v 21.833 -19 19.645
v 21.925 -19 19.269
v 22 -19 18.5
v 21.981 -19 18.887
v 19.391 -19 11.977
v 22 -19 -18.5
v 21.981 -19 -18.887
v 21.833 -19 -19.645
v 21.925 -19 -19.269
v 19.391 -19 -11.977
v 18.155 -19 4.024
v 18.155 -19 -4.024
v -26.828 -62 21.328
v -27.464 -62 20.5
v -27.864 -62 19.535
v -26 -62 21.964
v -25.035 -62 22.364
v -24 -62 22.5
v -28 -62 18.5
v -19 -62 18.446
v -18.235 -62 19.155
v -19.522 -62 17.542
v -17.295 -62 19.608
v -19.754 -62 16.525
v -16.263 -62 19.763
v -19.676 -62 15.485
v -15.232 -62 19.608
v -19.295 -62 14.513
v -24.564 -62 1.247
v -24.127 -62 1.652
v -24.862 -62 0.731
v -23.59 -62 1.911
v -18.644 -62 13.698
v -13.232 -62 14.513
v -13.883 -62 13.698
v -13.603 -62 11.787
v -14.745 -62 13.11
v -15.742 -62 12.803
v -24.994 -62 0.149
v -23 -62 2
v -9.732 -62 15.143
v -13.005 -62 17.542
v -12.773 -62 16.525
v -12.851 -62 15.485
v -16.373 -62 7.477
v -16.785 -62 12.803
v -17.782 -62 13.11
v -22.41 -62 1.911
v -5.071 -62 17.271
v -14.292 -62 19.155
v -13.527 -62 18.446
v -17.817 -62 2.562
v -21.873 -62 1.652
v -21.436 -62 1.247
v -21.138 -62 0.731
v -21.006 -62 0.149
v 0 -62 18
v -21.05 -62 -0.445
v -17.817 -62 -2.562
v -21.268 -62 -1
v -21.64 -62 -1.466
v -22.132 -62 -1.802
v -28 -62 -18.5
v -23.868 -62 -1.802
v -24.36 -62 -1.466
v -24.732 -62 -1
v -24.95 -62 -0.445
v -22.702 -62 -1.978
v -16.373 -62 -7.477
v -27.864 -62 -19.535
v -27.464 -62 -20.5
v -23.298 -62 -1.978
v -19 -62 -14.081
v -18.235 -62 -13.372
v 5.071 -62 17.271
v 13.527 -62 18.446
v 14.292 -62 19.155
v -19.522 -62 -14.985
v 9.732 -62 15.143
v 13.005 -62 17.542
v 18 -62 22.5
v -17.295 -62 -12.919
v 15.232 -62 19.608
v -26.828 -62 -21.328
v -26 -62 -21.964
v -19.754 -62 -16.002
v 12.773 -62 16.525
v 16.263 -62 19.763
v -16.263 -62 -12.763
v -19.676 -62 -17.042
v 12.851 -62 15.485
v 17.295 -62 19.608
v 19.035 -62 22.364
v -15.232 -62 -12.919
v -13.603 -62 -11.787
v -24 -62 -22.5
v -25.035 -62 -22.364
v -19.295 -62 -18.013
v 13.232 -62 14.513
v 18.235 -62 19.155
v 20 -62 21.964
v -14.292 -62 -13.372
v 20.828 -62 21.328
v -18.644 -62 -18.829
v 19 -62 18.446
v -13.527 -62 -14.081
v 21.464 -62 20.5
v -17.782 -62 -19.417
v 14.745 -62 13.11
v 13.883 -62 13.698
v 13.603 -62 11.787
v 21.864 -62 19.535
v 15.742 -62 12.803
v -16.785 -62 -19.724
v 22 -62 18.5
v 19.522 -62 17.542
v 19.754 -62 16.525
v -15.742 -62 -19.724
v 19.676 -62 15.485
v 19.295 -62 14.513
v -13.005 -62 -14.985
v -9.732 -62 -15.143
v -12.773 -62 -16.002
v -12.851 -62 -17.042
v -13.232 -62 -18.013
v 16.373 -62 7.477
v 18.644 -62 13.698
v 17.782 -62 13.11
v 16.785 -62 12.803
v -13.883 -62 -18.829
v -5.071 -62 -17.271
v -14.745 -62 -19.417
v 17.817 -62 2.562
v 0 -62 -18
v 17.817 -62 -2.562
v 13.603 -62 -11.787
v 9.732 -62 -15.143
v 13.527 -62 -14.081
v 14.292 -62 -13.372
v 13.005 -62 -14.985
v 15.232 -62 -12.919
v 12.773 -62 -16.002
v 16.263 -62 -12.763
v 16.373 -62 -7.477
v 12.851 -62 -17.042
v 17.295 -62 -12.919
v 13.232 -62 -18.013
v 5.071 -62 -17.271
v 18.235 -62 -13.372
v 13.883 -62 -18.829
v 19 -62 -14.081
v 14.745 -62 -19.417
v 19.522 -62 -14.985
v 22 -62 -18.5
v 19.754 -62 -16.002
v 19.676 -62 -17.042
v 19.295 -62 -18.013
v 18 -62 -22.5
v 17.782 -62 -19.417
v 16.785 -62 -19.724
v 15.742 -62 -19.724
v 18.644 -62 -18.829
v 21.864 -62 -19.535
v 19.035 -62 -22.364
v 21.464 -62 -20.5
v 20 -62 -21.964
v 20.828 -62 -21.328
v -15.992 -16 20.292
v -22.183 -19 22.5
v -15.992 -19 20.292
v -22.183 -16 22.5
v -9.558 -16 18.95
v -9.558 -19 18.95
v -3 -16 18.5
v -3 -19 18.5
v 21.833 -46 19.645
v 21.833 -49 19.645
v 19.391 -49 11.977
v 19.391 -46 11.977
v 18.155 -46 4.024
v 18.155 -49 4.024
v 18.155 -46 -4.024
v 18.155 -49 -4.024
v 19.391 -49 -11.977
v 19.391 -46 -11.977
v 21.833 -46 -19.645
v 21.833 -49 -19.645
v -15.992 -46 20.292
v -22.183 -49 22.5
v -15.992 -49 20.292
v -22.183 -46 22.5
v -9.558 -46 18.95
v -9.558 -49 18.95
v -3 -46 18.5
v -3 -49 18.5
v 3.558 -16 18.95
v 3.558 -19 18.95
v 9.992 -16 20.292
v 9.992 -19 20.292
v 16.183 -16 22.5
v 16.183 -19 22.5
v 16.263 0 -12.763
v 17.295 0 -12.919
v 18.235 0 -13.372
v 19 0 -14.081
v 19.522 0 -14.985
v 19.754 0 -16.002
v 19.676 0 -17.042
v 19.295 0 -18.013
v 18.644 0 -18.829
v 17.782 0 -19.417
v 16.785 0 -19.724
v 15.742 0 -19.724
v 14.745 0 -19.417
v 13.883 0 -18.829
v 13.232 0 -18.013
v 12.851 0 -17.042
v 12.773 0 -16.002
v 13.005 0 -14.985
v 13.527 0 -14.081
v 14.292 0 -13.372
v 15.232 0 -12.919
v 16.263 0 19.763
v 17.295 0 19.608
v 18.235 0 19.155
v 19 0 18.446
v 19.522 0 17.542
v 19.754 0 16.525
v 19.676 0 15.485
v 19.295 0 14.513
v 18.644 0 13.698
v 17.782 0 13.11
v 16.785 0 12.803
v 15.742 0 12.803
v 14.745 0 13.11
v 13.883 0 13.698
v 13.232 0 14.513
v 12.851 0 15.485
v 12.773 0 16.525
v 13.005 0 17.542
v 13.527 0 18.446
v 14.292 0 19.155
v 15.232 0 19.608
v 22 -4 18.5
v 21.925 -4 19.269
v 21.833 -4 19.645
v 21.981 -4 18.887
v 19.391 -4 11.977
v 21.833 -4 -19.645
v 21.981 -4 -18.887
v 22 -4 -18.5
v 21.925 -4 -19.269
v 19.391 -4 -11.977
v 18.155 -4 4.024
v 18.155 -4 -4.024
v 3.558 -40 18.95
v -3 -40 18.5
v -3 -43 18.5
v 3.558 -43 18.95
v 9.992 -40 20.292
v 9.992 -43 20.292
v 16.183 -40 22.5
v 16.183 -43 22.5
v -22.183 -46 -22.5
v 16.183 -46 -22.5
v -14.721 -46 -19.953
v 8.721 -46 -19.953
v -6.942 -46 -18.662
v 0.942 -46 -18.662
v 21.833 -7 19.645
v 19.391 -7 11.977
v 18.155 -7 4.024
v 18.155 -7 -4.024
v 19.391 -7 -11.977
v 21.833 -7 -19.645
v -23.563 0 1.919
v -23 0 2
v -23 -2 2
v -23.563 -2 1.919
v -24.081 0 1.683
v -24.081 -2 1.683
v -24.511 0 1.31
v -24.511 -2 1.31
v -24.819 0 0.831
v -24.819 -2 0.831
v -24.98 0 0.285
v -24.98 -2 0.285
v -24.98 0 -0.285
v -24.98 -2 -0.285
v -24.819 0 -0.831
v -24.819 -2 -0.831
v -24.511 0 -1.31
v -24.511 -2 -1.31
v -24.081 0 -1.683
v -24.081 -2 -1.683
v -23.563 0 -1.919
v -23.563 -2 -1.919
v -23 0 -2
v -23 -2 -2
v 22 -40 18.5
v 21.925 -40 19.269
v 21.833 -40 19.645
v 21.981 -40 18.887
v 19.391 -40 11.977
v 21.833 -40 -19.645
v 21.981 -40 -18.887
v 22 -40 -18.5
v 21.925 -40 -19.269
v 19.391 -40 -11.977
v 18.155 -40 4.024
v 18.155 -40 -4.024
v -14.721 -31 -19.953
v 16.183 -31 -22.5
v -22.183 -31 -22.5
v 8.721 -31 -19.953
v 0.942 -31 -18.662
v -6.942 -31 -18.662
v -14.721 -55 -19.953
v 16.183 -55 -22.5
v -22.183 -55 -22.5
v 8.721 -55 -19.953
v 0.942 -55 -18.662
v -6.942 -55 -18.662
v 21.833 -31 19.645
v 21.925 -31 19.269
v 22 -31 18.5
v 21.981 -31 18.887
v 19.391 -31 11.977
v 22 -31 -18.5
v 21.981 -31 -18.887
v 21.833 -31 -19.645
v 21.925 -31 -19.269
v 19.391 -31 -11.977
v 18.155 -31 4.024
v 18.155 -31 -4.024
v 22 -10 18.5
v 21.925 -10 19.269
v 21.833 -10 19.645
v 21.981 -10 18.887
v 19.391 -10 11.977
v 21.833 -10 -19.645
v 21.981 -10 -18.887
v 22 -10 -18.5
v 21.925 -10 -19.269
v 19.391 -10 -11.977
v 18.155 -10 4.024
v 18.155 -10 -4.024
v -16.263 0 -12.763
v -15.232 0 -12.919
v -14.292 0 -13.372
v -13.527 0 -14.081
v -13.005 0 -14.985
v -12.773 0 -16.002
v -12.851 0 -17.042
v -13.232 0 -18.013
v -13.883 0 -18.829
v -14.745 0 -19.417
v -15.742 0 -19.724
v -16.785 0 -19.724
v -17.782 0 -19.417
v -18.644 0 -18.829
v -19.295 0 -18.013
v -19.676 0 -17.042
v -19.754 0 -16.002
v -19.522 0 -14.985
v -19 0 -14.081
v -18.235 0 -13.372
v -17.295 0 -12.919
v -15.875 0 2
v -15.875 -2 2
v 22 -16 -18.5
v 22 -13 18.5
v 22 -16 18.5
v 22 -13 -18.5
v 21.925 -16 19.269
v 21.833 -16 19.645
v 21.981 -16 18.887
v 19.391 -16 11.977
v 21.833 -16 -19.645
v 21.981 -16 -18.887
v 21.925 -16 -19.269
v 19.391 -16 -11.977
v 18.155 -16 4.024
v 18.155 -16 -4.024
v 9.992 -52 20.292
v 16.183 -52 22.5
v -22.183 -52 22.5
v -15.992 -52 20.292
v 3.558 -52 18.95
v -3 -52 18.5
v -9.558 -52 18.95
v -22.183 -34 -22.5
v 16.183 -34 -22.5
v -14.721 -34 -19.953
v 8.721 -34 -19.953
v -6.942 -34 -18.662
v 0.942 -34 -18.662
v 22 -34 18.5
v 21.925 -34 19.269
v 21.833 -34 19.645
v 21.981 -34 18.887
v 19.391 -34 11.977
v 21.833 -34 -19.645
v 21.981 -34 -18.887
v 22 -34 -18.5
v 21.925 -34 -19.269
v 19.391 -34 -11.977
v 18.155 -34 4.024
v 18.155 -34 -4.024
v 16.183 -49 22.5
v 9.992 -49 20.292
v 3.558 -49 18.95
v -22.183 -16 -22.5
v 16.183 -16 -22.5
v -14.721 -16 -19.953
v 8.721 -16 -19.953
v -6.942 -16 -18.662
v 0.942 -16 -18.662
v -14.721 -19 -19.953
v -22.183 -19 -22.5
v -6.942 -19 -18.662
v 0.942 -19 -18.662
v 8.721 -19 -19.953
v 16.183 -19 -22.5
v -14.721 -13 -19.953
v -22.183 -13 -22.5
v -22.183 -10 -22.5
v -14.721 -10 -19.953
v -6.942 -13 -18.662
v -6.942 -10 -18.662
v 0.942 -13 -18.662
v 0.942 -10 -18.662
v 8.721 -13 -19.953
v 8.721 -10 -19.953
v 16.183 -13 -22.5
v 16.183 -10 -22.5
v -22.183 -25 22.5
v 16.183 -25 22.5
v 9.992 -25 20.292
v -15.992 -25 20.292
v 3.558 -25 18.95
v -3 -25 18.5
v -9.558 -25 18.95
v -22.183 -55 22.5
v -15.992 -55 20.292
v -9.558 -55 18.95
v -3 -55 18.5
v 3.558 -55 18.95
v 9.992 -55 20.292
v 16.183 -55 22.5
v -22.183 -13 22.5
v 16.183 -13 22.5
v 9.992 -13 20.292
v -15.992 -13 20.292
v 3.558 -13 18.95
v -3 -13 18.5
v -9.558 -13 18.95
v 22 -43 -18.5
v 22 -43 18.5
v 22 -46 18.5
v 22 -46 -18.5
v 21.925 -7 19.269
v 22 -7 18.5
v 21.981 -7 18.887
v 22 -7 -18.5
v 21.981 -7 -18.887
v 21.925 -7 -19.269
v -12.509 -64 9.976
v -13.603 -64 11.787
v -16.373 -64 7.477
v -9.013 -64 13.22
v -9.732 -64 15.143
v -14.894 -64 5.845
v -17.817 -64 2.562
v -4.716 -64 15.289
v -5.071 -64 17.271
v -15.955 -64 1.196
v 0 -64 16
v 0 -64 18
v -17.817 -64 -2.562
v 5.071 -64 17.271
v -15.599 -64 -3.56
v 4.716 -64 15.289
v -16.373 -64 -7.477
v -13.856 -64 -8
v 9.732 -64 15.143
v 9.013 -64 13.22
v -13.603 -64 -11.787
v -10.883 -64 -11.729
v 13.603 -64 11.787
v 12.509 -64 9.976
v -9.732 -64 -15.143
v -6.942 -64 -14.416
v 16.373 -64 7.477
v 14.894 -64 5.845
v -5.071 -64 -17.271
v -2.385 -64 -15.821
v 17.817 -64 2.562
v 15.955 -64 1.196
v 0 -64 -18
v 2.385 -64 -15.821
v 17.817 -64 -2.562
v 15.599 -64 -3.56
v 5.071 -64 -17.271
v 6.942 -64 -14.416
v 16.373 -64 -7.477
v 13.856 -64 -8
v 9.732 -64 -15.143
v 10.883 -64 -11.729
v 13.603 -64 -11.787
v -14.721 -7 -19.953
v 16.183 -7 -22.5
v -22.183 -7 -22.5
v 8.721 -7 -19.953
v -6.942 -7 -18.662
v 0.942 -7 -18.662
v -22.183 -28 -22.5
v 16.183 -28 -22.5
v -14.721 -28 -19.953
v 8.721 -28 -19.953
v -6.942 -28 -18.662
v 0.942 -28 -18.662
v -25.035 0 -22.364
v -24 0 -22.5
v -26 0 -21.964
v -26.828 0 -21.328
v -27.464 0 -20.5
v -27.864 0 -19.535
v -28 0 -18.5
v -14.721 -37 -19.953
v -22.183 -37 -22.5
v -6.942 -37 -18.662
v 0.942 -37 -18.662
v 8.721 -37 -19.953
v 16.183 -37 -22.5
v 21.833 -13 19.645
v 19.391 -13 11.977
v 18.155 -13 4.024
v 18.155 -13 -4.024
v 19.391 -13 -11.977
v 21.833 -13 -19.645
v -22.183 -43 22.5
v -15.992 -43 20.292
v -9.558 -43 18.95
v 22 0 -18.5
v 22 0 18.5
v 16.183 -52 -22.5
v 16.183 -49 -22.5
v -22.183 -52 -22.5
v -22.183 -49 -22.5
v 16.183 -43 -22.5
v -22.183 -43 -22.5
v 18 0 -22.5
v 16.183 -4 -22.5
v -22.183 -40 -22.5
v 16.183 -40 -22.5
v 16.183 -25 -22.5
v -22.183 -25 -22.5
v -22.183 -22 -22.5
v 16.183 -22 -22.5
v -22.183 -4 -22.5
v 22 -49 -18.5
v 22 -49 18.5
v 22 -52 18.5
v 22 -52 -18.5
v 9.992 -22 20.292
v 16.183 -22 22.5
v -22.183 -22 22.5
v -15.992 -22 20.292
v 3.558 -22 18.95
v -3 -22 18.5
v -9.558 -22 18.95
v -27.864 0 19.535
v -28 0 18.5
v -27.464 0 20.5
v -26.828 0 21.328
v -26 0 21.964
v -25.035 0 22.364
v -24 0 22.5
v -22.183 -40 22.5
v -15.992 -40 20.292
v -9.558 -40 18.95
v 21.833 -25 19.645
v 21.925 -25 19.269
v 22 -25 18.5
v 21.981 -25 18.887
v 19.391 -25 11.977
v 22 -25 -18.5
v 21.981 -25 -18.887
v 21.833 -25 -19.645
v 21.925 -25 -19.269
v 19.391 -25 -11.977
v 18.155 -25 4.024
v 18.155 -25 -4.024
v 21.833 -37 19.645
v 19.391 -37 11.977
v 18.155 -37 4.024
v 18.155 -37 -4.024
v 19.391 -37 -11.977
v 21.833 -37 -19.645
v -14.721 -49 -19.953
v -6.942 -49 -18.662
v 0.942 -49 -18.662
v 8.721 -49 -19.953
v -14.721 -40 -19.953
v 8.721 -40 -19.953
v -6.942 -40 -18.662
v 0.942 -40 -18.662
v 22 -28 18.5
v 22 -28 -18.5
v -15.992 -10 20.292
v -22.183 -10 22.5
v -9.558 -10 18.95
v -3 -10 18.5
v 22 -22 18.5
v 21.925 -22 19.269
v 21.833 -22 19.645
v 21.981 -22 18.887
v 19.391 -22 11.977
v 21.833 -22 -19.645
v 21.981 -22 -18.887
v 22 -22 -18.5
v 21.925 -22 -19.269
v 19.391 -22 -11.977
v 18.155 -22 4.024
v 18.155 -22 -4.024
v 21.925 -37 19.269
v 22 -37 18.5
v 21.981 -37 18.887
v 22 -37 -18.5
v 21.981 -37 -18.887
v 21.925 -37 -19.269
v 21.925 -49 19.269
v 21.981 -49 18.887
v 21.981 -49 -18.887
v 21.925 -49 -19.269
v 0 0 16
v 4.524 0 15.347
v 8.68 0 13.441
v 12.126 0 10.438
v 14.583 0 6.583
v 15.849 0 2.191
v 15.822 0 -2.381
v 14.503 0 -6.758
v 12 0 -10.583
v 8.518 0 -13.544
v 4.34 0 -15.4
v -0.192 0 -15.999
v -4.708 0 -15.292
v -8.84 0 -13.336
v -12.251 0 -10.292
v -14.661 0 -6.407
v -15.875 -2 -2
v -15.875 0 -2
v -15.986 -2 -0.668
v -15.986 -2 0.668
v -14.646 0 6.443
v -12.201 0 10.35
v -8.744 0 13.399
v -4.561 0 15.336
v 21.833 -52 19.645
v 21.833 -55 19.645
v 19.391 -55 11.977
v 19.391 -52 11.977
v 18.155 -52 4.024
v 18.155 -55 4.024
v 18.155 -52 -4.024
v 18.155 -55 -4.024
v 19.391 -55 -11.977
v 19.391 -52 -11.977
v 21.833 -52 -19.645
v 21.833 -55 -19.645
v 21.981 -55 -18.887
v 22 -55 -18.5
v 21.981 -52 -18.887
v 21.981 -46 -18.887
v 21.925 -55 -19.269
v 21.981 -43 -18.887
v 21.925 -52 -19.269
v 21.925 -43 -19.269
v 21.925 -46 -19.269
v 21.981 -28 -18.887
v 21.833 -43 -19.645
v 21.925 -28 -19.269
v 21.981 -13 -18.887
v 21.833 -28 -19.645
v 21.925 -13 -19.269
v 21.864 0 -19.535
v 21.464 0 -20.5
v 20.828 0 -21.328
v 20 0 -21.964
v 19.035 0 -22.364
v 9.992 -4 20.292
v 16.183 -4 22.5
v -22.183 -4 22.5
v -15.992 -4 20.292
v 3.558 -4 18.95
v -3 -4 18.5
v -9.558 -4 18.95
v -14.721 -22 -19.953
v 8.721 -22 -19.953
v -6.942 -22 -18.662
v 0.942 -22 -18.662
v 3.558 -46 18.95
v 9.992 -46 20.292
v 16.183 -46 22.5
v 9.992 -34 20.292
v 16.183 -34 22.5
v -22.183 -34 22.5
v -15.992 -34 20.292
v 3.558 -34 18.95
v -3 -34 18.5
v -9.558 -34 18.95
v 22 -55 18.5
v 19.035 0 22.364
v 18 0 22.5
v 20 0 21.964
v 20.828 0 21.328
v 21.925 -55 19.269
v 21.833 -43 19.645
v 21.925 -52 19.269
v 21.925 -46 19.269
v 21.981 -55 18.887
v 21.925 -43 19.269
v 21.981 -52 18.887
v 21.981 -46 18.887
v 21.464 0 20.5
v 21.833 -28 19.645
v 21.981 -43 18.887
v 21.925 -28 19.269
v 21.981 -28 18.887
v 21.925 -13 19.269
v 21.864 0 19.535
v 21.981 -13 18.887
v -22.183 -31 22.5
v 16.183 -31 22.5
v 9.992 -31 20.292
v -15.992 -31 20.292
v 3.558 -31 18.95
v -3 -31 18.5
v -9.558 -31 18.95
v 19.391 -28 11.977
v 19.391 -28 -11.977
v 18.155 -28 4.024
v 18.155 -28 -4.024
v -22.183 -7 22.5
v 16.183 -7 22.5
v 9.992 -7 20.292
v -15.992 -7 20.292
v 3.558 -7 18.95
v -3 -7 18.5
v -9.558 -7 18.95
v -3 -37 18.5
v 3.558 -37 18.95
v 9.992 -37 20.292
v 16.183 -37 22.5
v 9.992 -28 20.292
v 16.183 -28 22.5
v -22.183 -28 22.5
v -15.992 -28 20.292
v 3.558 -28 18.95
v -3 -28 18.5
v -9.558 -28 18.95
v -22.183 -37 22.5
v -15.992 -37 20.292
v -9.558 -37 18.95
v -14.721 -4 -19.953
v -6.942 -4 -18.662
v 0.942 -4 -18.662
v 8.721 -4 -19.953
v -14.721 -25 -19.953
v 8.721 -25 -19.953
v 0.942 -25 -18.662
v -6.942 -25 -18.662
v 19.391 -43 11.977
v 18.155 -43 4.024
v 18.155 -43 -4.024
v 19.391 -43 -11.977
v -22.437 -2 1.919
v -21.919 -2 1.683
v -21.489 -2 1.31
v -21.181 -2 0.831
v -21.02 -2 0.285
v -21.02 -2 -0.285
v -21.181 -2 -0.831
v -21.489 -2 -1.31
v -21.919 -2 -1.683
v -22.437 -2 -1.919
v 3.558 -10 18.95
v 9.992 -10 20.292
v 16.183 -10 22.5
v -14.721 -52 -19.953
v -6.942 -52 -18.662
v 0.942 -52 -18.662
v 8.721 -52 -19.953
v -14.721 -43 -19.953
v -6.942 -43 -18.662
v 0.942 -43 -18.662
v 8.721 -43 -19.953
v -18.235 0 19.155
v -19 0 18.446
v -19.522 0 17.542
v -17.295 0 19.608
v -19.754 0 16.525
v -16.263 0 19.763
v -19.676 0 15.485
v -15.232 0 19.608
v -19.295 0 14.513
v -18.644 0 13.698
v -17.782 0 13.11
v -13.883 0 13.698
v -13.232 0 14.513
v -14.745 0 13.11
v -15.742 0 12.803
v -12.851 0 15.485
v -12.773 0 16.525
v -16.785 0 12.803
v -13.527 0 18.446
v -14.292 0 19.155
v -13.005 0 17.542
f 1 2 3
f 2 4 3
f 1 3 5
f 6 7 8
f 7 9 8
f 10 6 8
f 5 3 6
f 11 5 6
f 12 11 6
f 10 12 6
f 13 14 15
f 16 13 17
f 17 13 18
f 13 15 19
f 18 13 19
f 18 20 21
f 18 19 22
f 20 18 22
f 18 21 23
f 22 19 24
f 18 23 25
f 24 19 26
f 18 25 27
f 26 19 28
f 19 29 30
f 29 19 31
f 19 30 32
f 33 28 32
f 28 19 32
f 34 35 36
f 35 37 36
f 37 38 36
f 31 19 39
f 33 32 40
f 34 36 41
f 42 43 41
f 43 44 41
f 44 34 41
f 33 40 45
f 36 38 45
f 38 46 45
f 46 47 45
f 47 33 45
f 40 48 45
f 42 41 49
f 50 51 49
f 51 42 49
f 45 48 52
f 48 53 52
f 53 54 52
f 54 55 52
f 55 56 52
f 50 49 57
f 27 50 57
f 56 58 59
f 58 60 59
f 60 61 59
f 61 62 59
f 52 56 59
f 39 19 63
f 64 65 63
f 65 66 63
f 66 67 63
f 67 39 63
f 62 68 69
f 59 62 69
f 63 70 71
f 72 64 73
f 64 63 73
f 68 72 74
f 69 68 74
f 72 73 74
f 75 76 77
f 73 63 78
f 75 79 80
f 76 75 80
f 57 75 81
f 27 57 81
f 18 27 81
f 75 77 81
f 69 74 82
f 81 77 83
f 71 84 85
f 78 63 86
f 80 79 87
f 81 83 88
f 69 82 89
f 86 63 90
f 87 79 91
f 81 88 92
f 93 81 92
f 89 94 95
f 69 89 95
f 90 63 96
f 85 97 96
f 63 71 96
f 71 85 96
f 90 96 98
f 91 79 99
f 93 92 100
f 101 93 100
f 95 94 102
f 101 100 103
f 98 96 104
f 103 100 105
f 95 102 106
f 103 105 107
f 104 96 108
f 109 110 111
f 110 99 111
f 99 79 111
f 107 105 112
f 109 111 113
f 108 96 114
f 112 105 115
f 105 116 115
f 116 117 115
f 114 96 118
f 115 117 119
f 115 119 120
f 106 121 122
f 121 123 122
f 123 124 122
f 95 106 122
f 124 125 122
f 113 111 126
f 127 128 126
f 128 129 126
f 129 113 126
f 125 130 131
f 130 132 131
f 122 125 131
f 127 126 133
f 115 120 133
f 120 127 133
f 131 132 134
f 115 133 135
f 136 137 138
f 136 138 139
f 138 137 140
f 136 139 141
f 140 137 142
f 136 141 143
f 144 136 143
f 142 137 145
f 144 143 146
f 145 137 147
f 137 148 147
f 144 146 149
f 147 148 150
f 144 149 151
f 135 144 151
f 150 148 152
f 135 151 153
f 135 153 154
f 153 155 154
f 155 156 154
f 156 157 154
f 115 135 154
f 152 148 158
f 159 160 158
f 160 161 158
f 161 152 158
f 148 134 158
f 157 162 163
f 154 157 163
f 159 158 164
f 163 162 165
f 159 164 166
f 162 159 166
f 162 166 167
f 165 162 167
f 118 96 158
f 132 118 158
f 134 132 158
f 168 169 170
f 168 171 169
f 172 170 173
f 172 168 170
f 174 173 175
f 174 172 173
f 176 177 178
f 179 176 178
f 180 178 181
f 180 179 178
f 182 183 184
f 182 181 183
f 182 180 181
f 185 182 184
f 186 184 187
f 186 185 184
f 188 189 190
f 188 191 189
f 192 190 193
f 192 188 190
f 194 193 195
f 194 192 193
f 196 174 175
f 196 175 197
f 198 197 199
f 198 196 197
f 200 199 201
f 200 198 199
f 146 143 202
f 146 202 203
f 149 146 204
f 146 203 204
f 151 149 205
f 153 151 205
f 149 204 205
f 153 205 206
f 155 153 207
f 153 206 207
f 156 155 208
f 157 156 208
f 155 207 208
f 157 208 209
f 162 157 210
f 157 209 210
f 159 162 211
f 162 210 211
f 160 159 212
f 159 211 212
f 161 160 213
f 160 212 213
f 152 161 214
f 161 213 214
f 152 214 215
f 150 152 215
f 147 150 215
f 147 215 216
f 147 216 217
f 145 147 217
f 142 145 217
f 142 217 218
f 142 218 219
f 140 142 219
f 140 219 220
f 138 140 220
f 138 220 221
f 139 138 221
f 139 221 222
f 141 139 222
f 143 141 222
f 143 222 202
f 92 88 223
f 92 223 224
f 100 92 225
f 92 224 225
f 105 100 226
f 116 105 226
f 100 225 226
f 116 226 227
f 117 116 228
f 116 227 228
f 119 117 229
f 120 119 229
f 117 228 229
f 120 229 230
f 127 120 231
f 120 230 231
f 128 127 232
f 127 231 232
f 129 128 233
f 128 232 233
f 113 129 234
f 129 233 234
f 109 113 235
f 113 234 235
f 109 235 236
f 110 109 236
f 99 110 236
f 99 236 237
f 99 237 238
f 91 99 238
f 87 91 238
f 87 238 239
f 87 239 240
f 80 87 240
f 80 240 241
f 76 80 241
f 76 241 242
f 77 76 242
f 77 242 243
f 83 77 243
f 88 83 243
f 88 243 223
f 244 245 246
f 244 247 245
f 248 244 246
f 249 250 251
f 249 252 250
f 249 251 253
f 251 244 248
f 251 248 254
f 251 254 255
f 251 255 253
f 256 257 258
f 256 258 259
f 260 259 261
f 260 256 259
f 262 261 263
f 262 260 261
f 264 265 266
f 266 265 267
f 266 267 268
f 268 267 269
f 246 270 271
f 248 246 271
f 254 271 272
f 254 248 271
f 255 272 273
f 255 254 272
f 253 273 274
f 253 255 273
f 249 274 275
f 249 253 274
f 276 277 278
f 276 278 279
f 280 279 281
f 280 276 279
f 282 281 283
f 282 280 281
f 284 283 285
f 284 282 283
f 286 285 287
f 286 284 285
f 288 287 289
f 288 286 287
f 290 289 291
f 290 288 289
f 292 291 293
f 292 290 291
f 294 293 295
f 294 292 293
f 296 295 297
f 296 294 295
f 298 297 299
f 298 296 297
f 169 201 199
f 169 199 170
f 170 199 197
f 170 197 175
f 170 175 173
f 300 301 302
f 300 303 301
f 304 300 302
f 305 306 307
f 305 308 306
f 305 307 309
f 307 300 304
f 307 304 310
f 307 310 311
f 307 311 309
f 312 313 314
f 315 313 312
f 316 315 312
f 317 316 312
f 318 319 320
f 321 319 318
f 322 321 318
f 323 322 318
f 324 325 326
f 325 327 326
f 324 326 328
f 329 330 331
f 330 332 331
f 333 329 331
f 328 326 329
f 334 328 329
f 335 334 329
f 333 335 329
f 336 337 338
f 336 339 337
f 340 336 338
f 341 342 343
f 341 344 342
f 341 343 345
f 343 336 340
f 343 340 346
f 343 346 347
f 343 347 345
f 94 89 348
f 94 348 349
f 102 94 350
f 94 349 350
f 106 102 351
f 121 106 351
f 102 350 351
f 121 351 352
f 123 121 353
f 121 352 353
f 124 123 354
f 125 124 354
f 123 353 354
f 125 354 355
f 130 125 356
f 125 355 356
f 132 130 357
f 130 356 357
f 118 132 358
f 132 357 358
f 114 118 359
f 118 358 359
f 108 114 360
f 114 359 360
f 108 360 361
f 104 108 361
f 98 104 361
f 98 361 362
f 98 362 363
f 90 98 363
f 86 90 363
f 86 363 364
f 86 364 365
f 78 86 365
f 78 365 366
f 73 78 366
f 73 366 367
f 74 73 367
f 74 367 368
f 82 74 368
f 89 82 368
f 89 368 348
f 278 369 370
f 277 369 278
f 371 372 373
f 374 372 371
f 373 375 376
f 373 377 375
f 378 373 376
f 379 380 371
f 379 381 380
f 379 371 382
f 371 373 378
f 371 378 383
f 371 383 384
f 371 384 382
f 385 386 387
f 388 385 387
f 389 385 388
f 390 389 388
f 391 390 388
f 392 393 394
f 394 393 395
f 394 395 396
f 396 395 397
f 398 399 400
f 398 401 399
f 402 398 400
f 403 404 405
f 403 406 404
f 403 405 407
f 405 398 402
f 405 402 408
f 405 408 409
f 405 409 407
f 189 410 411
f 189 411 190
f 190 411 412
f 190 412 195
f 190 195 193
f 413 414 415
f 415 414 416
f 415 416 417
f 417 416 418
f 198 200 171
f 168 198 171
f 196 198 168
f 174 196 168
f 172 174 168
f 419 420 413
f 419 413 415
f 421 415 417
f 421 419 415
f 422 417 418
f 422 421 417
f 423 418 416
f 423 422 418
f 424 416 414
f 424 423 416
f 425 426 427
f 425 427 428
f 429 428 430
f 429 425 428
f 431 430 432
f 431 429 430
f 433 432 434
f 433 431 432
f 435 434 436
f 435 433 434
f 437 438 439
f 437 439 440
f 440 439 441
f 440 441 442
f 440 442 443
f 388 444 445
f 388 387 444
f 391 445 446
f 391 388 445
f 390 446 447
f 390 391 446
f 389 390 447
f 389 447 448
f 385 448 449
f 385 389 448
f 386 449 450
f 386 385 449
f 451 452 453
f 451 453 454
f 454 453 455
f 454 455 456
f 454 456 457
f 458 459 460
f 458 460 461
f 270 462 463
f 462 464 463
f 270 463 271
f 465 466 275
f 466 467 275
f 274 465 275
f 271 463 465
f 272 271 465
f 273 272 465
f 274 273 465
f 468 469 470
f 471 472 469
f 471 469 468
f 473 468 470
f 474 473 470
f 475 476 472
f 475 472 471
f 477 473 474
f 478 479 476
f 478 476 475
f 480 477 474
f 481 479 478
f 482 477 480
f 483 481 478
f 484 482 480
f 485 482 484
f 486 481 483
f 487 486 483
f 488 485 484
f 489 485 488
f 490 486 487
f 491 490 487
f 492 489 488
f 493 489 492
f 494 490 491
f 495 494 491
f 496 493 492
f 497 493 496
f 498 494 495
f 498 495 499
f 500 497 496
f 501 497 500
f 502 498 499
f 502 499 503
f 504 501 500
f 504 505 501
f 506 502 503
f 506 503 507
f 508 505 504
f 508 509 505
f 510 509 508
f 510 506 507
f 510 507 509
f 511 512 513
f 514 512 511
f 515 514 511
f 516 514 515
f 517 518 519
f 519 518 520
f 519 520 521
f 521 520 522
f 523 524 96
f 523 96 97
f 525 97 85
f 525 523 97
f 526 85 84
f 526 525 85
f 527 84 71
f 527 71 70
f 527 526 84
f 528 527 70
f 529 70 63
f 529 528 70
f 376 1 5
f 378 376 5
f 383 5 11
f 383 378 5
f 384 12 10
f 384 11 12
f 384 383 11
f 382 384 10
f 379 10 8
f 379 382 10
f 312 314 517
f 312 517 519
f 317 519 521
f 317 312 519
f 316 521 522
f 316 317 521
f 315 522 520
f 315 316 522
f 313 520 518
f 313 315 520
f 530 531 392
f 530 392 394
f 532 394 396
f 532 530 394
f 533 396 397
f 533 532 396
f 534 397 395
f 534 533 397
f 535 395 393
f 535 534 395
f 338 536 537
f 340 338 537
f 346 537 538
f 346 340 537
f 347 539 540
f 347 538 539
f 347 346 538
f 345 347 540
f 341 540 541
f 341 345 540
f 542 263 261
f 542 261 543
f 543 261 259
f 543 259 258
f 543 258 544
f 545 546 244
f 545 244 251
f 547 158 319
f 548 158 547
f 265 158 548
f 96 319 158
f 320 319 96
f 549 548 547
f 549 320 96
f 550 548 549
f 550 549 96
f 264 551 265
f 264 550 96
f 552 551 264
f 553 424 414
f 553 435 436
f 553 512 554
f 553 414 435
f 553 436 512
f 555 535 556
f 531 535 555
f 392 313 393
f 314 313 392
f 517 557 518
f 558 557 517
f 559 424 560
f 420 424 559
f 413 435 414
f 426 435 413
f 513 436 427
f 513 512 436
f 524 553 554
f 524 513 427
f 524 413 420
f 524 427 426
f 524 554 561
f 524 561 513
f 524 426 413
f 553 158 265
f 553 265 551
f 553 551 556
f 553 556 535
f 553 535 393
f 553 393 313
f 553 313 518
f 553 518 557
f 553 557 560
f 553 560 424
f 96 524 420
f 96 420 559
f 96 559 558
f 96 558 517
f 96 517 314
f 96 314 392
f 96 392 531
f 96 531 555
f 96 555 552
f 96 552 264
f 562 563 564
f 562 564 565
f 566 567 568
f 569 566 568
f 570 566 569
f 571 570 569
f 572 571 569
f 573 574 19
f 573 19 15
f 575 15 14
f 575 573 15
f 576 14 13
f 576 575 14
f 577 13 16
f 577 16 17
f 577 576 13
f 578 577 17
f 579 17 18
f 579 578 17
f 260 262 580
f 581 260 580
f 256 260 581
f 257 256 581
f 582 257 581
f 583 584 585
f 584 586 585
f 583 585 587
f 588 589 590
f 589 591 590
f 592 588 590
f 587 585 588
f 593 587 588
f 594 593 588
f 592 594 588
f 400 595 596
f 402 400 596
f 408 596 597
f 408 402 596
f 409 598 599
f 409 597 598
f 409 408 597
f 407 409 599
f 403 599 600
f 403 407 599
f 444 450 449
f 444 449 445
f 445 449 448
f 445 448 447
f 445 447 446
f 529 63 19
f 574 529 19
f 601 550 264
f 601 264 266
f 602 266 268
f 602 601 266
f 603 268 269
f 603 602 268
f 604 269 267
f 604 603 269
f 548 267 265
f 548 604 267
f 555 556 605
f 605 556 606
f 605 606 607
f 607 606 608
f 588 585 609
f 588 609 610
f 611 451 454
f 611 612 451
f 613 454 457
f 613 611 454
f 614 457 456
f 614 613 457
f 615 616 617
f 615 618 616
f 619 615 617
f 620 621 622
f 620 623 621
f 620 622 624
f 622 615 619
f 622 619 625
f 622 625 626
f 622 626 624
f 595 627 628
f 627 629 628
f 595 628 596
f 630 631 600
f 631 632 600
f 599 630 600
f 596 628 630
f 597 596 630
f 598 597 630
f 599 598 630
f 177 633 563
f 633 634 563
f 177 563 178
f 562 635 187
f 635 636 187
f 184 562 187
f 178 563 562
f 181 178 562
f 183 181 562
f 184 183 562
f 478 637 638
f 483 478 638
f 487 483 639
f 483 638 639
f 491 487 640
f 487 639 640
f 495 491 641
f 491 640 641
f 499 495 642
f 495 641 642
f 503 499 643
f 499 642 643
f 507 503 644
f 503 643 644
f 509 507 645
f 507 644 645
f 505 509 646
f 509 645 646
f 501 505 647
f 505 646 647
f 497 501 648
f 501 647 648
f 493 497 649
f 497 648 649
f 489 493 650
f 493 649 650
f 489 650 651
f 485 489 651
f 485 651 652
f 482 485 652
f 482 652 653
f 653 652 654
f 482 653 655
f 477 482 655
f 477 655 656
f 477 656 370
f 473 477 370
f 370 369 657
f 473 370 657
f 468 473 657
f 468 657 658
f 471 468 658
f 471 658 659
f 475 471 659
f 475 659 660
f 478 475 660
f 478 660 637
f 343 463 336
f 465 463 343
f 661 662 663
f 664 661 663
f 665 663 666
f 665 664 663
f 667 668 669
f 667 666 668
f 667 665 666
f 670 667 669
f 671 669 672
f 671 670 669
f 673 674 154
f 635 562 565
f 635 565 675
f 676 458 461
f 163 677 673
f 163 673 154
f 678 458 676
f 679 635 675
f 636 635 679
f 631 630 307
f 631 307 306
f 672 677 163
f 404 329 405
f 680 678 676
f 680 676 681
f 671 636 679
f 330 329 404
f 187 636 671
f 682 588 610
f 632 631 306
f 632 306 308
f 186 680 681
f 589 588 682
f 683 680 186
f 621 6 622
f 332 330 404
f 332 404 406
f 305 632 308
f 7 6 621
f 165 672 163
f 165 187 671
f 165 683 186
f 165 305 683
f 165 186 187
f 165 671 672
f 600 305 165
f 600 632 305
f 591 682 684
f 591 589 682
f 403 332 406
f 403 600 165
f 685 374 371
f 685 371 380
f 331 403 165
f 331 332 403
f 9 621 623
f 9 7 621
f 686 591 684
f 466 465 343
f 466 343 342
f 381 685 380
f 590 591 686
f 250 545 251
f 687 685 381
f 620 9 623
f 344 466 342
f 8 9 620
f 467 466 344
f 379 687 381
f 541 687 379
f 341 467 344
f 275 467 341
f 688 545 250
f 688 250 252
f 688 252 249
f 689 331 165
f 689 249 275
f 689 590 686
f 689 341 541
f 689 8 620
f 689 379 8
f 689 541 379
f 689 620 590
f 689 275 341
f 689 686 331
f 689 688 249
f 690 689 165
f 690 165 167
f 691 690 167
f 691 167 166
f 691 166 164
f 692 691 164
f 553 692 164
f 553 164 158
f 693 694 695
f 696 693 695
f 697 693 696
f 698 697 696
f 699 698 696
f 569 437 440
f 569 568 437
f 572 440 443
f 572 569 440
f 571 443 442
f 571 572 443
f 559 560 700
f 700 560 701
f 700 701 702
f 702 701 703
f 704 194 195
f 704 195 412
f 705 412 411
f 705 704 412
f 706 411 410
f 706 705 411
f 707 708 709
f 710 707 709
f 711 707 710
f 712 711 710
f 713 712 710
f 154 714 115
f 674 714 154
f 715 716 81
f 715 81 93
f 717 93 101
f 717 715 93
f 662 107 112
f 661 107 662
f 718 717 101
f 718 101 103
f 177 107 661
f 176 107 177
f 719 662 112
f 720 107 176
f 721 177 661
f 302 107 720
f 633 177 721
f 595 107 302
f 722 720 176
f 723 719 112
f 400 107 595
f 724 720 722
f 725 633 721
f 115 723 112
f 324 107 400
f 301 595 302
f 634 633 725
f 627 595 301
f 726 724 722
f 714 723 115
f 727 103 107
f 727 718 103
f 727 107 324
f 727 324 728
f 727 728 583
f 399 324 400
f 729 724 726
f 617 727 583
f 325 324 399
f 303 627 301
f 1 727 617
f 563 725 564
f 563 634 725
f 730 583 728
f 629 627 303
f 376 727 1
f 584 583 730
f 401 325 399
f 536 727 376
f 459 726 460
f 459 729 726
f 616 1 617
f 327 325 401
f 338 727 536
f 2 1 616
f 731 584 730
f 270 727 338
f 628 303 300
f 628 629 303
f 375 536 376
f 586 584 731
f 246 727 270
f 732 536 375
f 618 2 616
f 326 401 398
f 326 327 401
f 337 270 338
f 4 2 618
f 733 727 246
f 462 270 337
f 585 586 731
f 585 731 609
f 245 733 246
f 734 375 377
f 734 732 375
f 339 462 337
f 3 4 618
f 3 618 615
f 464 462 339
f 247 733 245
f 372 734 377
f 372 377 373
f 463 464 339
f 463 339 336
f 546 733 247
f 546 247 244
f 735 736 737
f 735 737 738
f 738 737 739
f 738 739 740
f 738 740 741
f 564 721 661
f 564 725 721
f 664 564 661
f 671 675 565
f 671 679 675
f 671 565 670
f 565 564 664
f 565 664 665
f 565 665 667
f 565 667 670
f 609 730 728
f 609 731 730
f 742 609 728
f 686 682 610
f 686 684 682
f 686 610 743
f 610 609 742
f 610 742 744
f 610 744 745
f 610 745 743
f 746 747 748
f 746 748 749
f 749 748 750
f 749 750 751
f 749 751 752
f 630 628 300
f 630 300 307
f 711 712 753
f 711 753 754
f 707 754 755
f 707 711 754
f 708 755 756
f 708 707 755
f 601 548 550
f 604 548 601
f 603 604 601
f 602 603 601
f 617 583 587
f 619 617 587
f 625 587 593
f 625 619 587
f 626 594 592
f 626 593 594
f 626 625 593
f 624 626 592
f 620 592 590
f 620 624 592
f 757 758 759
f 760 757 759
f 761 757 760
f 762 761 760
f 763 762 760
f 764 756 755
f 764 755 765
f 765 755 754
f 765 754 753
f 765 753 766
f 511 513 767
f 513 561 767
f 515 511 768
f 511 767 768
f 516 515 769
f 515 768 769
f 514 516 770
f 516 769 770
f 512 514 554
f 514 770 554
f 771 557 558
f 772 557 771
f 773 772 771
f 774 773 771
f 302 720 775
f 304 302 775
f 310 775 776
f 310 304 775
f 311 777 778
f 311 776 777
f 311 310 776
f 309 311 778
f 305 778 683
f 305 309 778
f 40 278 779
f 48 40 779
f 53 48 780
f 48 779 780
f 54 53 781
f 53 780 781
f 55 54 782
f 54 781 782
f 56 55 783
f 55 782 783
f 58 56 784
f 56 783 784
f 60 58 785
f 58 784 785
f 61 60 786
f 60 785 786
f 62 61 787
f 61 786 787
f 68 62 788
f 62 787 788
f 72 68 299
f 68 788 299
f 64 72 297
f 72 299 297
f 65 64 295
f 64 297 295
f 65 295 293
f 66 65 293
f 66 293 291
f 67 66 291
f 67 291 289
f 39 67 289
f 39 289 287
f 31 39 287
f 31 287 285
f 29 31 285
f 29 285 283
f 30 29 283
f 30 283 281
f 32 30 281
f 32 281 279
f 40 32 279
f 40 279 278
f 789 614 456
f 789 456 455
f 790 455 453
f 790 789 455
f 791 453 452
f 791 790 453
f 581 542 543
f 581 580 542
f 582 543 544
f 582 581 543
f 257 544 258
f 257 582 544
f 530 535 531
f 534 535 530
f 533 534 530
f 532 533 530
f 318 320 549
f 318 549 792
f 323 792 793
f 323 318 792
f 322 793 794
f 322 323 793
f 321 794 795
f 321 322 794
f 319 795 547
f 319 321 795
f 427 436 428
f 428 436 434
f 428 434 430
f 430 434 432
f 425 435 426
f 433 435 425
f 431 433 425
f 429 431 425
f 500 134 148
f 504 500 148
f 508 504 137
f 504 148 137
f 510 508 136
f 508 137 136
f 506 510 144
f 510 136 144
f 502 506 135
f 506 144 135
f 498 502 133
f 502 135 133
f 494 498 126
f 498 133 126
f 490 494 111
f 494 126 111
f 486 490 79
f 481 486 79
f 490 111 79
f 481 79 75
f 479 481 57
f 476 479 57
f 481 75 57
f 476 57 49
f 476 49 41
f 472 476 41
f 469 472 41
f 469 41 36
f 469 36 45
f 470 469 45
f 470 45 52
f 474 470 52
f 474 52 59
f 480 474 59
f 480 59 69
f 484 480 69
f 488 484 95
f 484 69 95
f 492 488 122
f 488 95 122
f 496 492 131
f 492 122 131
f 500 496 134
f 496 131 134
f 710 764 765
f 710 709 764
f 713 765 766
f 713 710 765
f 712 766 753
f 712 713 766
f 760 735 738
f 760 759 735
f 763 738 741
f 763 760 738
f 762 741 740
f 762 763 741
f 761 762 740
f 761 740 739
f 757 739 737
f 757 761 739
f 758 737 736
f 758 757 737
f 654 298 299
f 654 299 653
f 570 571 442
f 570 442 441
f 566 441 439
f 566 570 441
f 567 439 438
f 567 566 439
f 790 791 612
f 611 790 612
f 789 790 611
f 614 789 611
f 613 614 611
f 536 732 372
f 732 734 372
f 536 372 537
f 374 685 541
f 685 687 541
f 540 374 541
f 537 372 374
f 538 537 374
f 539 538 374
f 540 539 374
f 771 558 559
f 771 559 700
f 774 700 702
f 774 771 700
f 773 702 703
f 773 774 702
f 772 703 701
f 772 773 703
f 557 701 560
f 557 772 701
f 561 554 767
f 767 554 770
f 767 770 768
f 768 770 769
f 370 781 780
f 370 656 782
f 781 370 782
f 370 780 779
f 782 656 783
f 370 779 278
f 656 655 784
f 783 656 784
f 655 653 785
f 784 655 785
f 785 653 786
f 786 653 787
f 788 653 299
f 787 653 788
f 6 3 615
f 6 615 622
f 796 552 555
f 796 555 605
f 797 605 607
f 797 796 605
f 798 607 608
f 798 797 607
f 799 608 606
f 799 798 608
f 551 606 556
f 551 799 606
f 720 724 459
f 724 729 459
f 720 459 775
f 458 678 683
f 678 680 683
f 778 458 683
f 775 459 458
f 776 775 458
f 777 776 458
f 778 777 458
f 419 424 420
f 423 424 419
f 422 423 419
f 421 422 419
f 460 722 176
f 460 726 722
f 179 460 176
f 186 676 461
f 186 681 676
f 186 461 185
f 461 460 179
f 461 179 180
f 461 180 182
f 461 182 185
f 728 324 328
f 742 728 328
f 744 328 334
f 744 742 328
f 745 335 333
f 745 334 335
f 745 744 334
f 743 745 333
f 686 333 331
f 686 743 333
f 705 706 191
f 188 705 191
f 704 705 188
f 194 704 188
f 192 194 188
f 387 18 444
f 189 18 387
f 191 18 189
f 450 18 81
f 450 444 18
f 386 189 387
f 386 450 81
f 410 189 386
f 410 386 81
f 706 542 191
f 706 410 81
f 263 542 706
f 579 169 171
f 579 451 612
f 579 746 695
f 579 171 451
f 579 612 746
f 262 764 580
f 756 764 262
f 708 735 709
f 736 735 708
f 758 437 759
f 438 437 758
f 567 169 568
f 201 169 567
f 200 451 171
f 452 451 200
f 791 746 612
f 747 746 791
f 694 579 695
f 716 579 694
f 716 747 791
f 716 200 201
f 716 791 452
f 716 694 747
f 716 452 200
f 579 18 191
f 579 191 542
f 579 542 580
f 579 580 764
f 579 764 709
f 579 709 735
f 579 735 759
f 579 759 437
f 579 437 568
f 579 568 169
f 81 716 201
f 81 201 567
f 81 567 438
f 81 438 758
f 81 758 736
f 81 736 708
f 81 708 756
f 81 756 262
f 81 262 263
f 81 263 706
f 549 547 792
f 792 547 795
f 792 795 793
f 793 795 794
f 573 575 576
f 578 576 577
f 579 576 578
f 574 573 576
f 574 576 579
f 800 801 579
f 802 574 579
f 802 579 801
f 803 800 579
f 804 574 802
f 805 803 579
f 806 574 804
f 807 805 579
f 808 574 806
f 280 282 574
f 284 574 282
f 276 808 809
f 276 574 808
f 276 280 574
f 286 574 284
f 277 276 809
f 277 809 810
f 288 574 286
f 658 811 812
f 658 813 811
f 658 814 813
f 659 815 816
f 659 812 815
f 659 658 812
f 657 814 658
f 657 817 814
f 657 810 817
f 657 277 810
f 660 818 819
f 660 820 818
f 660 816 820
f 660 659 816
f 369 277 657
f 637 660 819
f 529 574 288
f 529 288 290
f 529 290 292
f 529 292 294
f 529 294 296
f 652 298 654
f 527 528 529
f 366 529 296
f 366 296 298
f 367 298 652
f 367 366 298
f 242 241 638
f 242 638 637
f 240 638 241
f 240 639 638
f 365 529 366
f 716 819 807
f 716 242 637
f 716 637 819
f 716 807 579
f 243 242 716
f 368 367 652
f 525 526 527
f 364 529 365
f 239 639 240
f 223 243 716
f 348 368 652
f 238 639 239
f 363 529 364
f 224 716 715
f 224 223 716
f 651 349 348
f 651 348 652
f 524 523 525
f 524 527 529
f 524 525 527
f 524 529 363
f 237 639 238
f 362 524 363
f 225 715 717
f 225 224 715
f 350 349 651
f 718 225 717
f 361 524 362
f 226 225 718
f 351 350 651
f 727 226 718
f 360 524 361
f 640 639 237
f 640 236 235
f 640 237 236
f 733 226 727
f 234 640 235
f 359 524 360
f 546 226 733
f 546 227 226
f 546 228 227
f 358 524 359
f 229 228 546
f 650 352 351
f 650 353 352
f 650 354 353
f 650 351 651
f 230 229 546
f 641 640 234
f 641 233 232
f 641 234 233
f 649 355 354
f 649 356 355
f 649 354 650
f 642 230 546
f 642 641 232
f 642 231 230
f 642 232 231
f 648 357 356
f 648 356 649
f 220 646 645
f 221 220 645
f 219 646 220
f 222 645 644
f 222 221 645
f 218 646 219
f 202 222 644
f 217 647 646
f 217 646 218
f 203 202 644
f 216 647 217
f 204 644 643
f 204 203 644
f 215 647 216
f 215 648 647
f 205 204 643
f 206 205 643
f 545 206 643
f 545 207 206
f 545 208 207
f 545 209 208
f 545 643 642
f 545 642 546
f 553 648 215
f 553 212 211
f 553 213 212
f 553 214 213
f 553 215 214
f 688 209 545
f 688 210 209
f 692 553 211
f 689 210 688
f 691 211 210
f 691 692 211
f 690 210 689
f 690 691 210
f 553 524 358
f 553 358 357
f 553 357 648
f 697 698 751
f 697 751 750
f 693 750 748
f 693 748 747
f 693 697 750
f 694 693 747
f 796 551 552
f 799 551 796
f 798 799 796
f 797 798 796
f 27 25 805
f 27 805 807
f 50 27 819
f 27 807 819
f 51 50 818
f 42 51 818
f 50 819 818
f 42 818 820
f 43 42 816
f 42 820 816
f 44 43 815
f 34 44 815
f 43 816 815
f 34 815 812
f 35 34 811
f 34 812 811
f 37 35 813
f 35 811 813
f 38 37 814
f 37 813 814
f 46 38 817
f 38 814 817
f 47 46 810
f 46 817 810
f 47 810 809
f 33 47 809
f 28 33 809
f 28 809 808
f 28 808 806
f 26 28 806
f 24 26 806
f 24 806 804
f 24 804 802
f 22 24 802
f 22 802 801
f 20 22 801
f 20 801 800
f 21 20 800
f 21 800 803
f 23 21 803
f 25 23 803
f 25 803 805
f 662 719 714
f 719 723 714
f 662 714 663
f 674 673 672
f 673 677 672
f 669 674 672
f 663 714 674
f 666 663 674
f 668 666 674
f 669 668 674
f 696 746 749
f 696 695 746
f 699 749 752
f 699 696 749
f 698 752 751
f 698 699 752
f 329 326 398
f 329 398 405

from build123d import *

# Parameters (mm, degrees)
BOSS_EXTRUDE1_DEPTH     = 62
SKETCH3_R               = 18
BOSS_EXTRUDE2_DEPTH     = 2
SKETCH4_R               = 16
CUT_EXTRUDE1_DEPTH      = 74.391075752
CUT_EXTRUDE2_DEPTH      = 2
SKETCH6_R               = 2
CUT_EXTRUDE3_DEPTH      = 72.653680994
SKETCH7_R               = 3.5
CUT_EXTRUDE4_DEPTH      = 74.391075752
SKETCH8_W               = 48
SKETCH8_H               = 3
LPATTERN1_COUNT         = 9
LPATTERN1_PITCH         = 6
MIRROR1_COPY_1_SKETCH_W = 48
MIRROR1_COPY_1_SKETCH_H = 3
MIRROR1_COPY_2_SKETCH_W = 48
MIRROR1_COPY_2_SKETCH_H = 3
MIRROR1_COPY_3_SKETCH_W = 48
MIRROR1_COPY_3_SKETCH_H = 3
MIRROR1_COPY_4_SKETCH_W = 48
MIRROR1_COPY_4_SKETCH_H = 3
MIRROR1_COPY_5_SKETCH_W = 48
MIRROR1_COPY_5_SKETCH_H = 3
MIRROR1_COPY_6_SKETCH_W = 48
MIRROR1_COPY_6_SKETCH_H = 3
MIRROR1_COPY_7_SKETCH_W = 48
MIRROR1_COPY_7_SKETCH_H = 3
MIRROR1_COPY_8_SKETCH_W = 48
MIRROR1_COPY_8_SKETCH_H = 3
SKETCH11_W              = 52.265084003
SKETCH11_H              = 3
LPATTERN2_COUNT         = 9
LPATTERN2_PITCH         = 6


with BuildPart() as part:
    # Sketch1 → Boss-Extrude1 (new body)
    with BuildSketch(Plane(origin=(0, 0, 0), x_dir=(1, 0, 0), z_dir=(0, 1, 0))):
        with BuildLine():
            Line((18, 22.5), (-24, 22.5))
            ThreePointArc((-24, 22.5), (-26.828427125, 21.328427125), (-28, 18.5))
            Line((-28, 18.5), (-28, -18.5))
            ThreePointArc((-28, -18.5), (-26.828427125, -21.328427125), (-24, -22.5))
            Line((-24, -22.5), (18, -22.5))
            ThreePointArc((18, -22.5), (20.828427125, -21.328427125), (22, -18.5))
            Line((22, -18.5), (22, 18.5))
            ThreePointArc((22, 18.5), (20.828427125, 21.328427125), (18, 22.5))
        make_face()
    extrude(amount=-BOSS_EXTRUDE1_DEPTH)

    # Sketch3 → Boss-Extrude2 (add)
    with BuildSketch(Plane.XZ.offset(62)):
        with Locations(Location((0, 0, 0), (0, 0, 270))):
            Circle(SKETCH3_R)
    extrude(amount=BOSS_EXTRUDE2_DEPTH)

    # Sketch4 → Cut-Extrude1 (cut, through all)
    with BuildSketch(Plane(origin=(0, 0, 0), x_dir=(1, 0, 0), z_dir=(0, 1, 0))):
        with Locations(Location((0, 0, 0), (0, 0, 270))):
            Circle(SKETCH4_R)
    extrude(amount=-CUT_EXTRUDE1_DEPTH, mode=Mode.SUBTRACT)

    # Sketch5 → Cut-Extrude2 (cut)
    with BuildSketch(Plane(origin=(0, 0, 0), x_dir=(1, 0, 0), z_dir=(0, 1, 0))):
        with BuildLine():
            Line((-23, 2), (-11, 2))
            ThreePointArc((-11, 2), (-9, 0), (-11, -2))
            Line((-11, -2), (-23, -2))
            ThreePointArc((-23, -2), (-25, 0), (-23, 2))
        make_face()
    extrude(amount=-CUT_EXTRUDE2_DEPTH, mode=Mode.SUBTRACT)

    # Sketch6 → Cut-Extrude3 (cut, through all)
    with BuildSketch(Plane(origin=(0, -2, 0), x_dir=(1, 0, 0), z_dir=(0, 1, 0))):
        with Locations(Location((-23, 0, 0), (0, 0, 270))):
            Circle(SKETCH6_R)
    extrude(amount=-CUT_EXTRUDE3_DEPTH, mode=Mode.SUBTRACT)

    # Sketch7 → Cut-Extrude4 (cut, through all)
    with BuildSketch(Plane(origin=(0, 0, 0), x_dir=(1, 0, 0), z_dir=(0, 1, 0))):
        with Locations(Location((16.263455967, 16.263455967, 0), (0, 0, 270))):
            Circle(SKETCH7_R)
        with Locations(Location((16.263455967, -16.263455967, 0), (0, 0, 270))):
            Circle(SKETCH7_R)
        with Locations(Location((-16.263455967, -16.263455967, 0), (0, 0, 270))):
            Circle(SKETCH7_R)
        with Locations(Location((-16.263455967, 16.263455967, 0), (0, 0, 270))):
            Circle(SKETCH7_R)
    extrude(amount=-CUT_EXTRUDE4_DEPTH, mode=Mode.SUBTRACT)

    # Sketch8 → Cut-Revolve1 (revolve, cut)
    with BuildSketch(Plane(origin=(-3, 0, 0), x_dir=(0, 0, -1), z_dir=(1, 0, 0))):
        with Locations((-42.5, -5.5)):
            Rectangle(SKETCH8_W, SKETCH8_H)
    cut_revolve1 = revolve(axis=Axis((-3, -4, 66.5), (0, -1, 0)), mode=Mode.SUBTRACT)

    # LPattern1: Cut-Revolve1 ×9
    with Locations(*[(0, -i * LPATTERN1_PITCH, 0) for i in range(1, LPATTERN1_COUNT)]):
        add(cut_revolve1, mode=Mode.SUBTRACT)

    # Mirror1: Cut-Revolve1 across plane
    add(cut_revolve1.mirror(Plane.XY), mode=Mode.SUBTRACT)

    # Mirror1 copy 1 sketch → Mirror1 copy 1 (revolve, cut)
    with BuildSketch(Plane(origin=(-3, -6, 0), x_dir=(0, 0, 1), z_dir=(1, 0, 0))):
        with Locations((-42.5, 5.5)):
            Rectangle(MIRROR1_COPY_1_SKETCH_W, MIRROR1_COPY_1_SKETCH_H)
    revolve(axis=Axis((-3, -10, -66.5), (0, 1, 0)), mode=Mode.SUBTRACT)

    # Mirror1 copy 2 sketch → Mirror1 copy 2 (revolve, cut)
    with BuildSketch(Plane(origin=(-3, -12, 0), x_dir=(0, 0, 1), z_dir=(1, 0, 0))):
        with Locations((-42.5, 5.5)):
            Rectangle(MIRROR1_COPY_2_SKETCH_W, MIRROR1_COPY_2_SKETCH_H)
    revolve(axis=Axis((-3, -16, -66.5), (0, 1, 0)), mode=Mode.SUBTRACT)

    # Mirror1 copy 3 sketch → Mirror1 copy 3 (revolve, cut)
    with BuildSketch(Plane(origin=(-3, -18, 0), x_dir=(0, 0, 1), z_dir=(1, 0, 0))):
        with Locations((-42.5, 5.5)):
            Rectangle(MIRROR1_COPY_3_SKETCH_W, MIRROR1_COPY_3_SKETCH_H)
    revolve(axis=Axis((-3, -22, -66.5), (0, 1, 0)), mode=Mode.SUBTRACT)

    # Mirror1 copy 4 sketch → Mirror1 copy 4 (revolve, cut)
    with BuildSketch(Plane(origin=(-3, -24, 0), x_dir=(0, 0, 1), z_dir=(1, 0, 0))):
        with Locations((-42.5, 5.5)):
            Rectangle(MIRROR1_COPY_4_SKETCH_W, MIRROR1_COPY_4_SKETCH_H)
    revolve(axis=Axis((-3, -28, -66.5), (0, 1, 0)), mode=Mode.SUBTRACT)

    # Mirror1 copy 5 sketch → Mirror1 copy 5 (revolve, cut)
    with BuildSketch(Plane(origin=(-3, -30, 0), x_dir=(0, 0, 1), z_dir=(1, 0, 0))):
        with Locations((-42.5, 5.5)):
            Rectangle(MIRROR1_COPY_5_SKETCH_W, MIRROR1_COPY_5_SKETCH_H)
    revolve(axis=Axis((-3, -34, -66.5), (0, 1, 0)), mode=Mode.SUBTRACT)

    # Mirror1 copy 6 sketch → Mirror1 copy 6 (revolve, cut)
    with BuildSketch(Plane(origin=(-3, -36, 0), x_dir=(0, 0, 1), z_dir=(1, 0, 0))):
        with Locations((-42.5, 5.5)):
            Rectangle(MIRROR1_COPY_6_SKETCH_W, MIRROR1_COPY_6_SKETCH_H)
    revolve(axis=Axis((-3, -40, -66.5), (0, 1, 0)), mode=Mode.SUBTRACT)

    # Mirror1 copy 7 sketch → Mirror1 copy 7 (revolve, cut)
    with BuildSketch(Plane(origin=(-3, -42, 0), x_dir=(0, 0, 1), z_dir=(1, 0, 0))):
        with Locations((-42.5, 5.5)):
            Rectangle(MIRROR1_COPY_7_SKETCH_W, MIRROR1_COPY_7_SKETCH_H)
    revolve(axis=Axis((-3, -46, -66.5), (0, 1, 0)), mode=Mode.SUBTRACT)

    # Mirror1 copy 8 sketch → Mirror1 copy 8 (revolve, cut)
    with BuildSketch(Plane(origin=(-3, -48, 0), x_dir=(0, 0, 1), z_dir=(1, 0, 0))):
        with Locations((-42.5, 5.5)):
            Rectangle(MIRROR1_COPY_8_SKETCH_W, MIRROR1_COPY_8_SKETCH_H)
    revolve(axis=Axis((-3, -52, -66.5), (0, 1, 0)), mode=Mode.SUBTRACT)

    # Sketch11 → Cut-Revolve3 (revolve, cut)
    with BuildSketch(Plane.XY):
        with Locations((44.132542001, -5.5)):
            Rectangle(SKETCH11_W, SKETCH11_H)
    cut_revolve3 = revolve(axis=Axis((70.265084003, -4, 0), (0, -1, 0)), mode=Mode.SUBTRACT)

    # LPattern2: Cut-Revolve3 ×9
    with Locations(*[(0, -i * LPATTERN2_PITCH, 0) for i in range(1, LPATTERN2_COUNT)]):
        add(cut_revolve3, mode=Mode.SUBTRACT)


solid = part.part
